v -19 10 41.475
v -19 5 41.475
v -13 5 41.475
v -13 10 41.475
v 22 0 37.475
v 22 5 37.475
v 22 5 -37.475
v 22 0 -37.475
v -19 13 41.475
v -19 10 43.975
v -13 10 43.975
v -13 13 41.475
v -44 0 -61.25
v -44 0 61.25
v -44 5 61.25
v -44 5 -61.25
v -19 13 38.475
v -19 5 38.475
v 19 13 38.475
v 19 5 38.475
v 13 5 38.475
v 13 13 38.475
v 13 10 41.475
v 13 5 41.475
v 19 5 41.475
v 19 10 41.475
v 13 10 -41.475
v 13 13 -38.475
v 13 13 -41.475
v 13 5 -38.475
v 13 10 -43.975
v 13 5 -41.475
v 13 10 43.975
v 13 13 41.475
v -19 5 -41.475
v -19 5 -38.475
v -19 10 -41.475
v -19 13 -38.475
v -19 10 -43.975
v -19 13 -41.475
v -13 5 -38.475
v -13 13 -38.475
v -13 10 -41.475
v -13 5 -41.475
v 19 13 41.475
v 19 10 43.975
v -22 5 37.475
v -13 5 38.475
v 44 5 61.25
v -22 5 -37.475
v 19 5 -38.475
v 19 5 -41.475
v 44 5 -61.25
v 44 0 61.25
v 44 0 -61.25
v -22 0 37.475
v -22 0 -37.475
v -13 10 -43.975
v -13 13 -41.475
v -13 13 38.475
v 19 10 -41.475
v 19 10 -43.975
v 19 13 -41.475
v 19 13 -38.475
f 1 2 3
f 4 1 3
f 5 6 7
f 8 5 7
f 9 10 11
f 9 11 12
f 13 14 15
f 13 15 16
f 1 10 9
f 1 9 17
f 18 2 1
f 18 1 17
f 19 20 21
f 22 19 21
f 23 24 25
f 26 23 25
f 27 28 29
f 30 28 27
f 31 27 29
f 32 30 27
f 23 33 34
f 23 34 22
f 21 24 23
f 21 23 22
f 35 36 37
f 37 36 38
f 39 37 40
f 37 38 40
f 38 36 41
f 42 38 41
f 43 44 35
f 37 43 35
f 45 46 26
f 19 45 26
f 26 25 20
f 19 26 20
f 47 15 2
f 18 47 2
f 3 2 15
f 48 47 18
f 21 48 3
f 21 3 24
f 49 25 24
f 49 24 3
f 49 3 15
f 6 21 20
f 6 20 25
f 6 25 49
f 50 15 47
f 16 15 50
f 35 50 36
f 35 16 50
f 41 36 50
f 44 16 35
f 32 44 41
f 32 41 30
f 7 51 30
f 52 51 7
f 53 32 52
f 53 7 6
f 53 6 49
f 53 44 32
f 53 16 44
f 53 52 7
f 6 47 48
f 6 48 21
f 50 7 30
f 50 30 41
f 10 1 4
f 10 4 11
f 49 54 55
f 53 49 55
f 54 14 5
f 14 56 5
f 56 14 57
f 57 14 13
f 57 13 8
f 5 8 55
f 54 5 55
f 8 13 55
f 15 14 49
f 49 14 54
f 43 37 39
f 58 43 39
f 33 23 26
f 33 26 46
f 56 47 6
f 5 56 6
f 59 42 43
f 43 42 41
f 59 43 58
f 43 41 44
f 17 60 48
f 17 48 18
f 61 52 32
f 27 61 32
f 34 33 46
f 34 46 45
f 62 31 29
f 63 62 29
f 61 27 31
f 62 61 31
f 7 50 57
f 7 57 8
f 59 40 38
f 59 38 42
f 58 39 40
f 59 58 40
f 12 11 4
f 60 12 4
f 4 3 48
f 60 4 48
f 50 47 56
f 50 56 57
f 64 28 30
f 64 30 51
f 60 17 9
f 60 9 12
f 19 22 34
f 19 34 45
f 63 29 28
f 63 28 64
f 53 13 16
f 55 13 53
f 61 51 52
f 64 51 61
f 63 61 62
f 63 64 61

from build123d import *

# Parameters (mm, degrees)
CROQUIS1_W              = 88
CROQUIS1_H              = 122.5
SALIENTE_EXTRUIR1_DEPTH = 5
CROQUIS2_W              = 44
CROQUIS2_H              = 74.95
CORTAR_EXTRUIR1_DEPTH   = 5
CROQUIS3_W              = 3
CROQUIS3_H              = 3
SALIENTE_EXTRUIR7_DEPTH = 8
SALIENTE_EXTRUIR8_DEPTH = 38
CROQUIS6_W              = 26
CROQUIS6_H              = 87.95
CORTAR_EXTRUIR3_DEPTH   = 19


with BuildPart() as part:
    # Croquis1 → Saliente-Extruir1 (new body)
    with BuildSketch(Plane(origin=(0, 0, 0), x_dir=(1, 0, 0), z_dir=(0, 1, 0))):
        Rectangle(CROQUIS1_W, CROQUIS1_H)
    extrude(amount=SALIENTE_EXTRUIR1_DEPTH)

    # Croquis2 → Cortar-Extruir1 (cut)
    with BuildSketch(Plane(origin=(0, 5, 0), x_dir=(1, 0, 0), z_dir=(0, 1, 0))):
        Rectangle(CROQUIS2_W, CROQUIS2_H)
    extrude(amount=-CORTAR_EXTRUIR1_DEPTH, mode=Mode.SUBTRACT)

    # Croquis3 → Saliente-Extruir7 (add)
    with BuildSketch(Plane(origin=(0, 5, 0), x_dir=(1, 0, 0), z_dir=(0, 1, 0))):
        with Locations((-14.5, 39.975)):
            Rectangle(CROQUIS3_W, CROQUIS3_H)
        with Locations((-17.5, 39.975)):
            Rectangle(CROQUIS3_W, CROQUIS3_H)
        with Locations((17.5, 39.975)):
            Rectangle(CROQUIS3_W, CROQUIS3_H)
        with Locations((14.5, 39.975)):
            Rectangle(CROQUIS3_W, CROQUIS3_H)
        with Locations((-14.5, -39.975)):
            Rectangle(CROQUIS3_W, CROQUIS3_H)
        with Locations((-17.5, -39.975)):
            Rectangle(CROQUIS3_W, CROQUIS3_H)
        with Locations((17.5, -39.975)):
            Rectangle(CROQUIS3_W, CROQUIS3_H)
        with Locations((14.5, -39.975)):
            Rectangle(CROQUIS3_W, CROQUIS3_H)
    extrude(amount=SALIENTE_EXTRUIR7_DEPTH)

    # Croquis5 → Saliente-Extruir8 (add)
    with BuildSketch(Plane.ZY.offset(19)):
        Polygon((-41.475, 13), (-41.475, 10), (-43.975, 10), align=None)
        Polygon((43.975, 10), (41.475, 13), (41.475, 10), align=None)
    extrude(amount=-SALIENTE_EXTRUIR8_DEPTH)

    # Croquis6 → Cortar-Extruir3 (cut)
    with BuildSketch(Plane(origin=(0, 5, 0), x_dir=(1, 0, 0), z_dir=(0, 1, 0))):
        Rectangle(CROQUIS6_W, CROQUIS6_H)
    extrude(amount=CORTAR_EXTRUIR3_DEPTH, mode=Mode.SUBTRACT)


solid = part.part
